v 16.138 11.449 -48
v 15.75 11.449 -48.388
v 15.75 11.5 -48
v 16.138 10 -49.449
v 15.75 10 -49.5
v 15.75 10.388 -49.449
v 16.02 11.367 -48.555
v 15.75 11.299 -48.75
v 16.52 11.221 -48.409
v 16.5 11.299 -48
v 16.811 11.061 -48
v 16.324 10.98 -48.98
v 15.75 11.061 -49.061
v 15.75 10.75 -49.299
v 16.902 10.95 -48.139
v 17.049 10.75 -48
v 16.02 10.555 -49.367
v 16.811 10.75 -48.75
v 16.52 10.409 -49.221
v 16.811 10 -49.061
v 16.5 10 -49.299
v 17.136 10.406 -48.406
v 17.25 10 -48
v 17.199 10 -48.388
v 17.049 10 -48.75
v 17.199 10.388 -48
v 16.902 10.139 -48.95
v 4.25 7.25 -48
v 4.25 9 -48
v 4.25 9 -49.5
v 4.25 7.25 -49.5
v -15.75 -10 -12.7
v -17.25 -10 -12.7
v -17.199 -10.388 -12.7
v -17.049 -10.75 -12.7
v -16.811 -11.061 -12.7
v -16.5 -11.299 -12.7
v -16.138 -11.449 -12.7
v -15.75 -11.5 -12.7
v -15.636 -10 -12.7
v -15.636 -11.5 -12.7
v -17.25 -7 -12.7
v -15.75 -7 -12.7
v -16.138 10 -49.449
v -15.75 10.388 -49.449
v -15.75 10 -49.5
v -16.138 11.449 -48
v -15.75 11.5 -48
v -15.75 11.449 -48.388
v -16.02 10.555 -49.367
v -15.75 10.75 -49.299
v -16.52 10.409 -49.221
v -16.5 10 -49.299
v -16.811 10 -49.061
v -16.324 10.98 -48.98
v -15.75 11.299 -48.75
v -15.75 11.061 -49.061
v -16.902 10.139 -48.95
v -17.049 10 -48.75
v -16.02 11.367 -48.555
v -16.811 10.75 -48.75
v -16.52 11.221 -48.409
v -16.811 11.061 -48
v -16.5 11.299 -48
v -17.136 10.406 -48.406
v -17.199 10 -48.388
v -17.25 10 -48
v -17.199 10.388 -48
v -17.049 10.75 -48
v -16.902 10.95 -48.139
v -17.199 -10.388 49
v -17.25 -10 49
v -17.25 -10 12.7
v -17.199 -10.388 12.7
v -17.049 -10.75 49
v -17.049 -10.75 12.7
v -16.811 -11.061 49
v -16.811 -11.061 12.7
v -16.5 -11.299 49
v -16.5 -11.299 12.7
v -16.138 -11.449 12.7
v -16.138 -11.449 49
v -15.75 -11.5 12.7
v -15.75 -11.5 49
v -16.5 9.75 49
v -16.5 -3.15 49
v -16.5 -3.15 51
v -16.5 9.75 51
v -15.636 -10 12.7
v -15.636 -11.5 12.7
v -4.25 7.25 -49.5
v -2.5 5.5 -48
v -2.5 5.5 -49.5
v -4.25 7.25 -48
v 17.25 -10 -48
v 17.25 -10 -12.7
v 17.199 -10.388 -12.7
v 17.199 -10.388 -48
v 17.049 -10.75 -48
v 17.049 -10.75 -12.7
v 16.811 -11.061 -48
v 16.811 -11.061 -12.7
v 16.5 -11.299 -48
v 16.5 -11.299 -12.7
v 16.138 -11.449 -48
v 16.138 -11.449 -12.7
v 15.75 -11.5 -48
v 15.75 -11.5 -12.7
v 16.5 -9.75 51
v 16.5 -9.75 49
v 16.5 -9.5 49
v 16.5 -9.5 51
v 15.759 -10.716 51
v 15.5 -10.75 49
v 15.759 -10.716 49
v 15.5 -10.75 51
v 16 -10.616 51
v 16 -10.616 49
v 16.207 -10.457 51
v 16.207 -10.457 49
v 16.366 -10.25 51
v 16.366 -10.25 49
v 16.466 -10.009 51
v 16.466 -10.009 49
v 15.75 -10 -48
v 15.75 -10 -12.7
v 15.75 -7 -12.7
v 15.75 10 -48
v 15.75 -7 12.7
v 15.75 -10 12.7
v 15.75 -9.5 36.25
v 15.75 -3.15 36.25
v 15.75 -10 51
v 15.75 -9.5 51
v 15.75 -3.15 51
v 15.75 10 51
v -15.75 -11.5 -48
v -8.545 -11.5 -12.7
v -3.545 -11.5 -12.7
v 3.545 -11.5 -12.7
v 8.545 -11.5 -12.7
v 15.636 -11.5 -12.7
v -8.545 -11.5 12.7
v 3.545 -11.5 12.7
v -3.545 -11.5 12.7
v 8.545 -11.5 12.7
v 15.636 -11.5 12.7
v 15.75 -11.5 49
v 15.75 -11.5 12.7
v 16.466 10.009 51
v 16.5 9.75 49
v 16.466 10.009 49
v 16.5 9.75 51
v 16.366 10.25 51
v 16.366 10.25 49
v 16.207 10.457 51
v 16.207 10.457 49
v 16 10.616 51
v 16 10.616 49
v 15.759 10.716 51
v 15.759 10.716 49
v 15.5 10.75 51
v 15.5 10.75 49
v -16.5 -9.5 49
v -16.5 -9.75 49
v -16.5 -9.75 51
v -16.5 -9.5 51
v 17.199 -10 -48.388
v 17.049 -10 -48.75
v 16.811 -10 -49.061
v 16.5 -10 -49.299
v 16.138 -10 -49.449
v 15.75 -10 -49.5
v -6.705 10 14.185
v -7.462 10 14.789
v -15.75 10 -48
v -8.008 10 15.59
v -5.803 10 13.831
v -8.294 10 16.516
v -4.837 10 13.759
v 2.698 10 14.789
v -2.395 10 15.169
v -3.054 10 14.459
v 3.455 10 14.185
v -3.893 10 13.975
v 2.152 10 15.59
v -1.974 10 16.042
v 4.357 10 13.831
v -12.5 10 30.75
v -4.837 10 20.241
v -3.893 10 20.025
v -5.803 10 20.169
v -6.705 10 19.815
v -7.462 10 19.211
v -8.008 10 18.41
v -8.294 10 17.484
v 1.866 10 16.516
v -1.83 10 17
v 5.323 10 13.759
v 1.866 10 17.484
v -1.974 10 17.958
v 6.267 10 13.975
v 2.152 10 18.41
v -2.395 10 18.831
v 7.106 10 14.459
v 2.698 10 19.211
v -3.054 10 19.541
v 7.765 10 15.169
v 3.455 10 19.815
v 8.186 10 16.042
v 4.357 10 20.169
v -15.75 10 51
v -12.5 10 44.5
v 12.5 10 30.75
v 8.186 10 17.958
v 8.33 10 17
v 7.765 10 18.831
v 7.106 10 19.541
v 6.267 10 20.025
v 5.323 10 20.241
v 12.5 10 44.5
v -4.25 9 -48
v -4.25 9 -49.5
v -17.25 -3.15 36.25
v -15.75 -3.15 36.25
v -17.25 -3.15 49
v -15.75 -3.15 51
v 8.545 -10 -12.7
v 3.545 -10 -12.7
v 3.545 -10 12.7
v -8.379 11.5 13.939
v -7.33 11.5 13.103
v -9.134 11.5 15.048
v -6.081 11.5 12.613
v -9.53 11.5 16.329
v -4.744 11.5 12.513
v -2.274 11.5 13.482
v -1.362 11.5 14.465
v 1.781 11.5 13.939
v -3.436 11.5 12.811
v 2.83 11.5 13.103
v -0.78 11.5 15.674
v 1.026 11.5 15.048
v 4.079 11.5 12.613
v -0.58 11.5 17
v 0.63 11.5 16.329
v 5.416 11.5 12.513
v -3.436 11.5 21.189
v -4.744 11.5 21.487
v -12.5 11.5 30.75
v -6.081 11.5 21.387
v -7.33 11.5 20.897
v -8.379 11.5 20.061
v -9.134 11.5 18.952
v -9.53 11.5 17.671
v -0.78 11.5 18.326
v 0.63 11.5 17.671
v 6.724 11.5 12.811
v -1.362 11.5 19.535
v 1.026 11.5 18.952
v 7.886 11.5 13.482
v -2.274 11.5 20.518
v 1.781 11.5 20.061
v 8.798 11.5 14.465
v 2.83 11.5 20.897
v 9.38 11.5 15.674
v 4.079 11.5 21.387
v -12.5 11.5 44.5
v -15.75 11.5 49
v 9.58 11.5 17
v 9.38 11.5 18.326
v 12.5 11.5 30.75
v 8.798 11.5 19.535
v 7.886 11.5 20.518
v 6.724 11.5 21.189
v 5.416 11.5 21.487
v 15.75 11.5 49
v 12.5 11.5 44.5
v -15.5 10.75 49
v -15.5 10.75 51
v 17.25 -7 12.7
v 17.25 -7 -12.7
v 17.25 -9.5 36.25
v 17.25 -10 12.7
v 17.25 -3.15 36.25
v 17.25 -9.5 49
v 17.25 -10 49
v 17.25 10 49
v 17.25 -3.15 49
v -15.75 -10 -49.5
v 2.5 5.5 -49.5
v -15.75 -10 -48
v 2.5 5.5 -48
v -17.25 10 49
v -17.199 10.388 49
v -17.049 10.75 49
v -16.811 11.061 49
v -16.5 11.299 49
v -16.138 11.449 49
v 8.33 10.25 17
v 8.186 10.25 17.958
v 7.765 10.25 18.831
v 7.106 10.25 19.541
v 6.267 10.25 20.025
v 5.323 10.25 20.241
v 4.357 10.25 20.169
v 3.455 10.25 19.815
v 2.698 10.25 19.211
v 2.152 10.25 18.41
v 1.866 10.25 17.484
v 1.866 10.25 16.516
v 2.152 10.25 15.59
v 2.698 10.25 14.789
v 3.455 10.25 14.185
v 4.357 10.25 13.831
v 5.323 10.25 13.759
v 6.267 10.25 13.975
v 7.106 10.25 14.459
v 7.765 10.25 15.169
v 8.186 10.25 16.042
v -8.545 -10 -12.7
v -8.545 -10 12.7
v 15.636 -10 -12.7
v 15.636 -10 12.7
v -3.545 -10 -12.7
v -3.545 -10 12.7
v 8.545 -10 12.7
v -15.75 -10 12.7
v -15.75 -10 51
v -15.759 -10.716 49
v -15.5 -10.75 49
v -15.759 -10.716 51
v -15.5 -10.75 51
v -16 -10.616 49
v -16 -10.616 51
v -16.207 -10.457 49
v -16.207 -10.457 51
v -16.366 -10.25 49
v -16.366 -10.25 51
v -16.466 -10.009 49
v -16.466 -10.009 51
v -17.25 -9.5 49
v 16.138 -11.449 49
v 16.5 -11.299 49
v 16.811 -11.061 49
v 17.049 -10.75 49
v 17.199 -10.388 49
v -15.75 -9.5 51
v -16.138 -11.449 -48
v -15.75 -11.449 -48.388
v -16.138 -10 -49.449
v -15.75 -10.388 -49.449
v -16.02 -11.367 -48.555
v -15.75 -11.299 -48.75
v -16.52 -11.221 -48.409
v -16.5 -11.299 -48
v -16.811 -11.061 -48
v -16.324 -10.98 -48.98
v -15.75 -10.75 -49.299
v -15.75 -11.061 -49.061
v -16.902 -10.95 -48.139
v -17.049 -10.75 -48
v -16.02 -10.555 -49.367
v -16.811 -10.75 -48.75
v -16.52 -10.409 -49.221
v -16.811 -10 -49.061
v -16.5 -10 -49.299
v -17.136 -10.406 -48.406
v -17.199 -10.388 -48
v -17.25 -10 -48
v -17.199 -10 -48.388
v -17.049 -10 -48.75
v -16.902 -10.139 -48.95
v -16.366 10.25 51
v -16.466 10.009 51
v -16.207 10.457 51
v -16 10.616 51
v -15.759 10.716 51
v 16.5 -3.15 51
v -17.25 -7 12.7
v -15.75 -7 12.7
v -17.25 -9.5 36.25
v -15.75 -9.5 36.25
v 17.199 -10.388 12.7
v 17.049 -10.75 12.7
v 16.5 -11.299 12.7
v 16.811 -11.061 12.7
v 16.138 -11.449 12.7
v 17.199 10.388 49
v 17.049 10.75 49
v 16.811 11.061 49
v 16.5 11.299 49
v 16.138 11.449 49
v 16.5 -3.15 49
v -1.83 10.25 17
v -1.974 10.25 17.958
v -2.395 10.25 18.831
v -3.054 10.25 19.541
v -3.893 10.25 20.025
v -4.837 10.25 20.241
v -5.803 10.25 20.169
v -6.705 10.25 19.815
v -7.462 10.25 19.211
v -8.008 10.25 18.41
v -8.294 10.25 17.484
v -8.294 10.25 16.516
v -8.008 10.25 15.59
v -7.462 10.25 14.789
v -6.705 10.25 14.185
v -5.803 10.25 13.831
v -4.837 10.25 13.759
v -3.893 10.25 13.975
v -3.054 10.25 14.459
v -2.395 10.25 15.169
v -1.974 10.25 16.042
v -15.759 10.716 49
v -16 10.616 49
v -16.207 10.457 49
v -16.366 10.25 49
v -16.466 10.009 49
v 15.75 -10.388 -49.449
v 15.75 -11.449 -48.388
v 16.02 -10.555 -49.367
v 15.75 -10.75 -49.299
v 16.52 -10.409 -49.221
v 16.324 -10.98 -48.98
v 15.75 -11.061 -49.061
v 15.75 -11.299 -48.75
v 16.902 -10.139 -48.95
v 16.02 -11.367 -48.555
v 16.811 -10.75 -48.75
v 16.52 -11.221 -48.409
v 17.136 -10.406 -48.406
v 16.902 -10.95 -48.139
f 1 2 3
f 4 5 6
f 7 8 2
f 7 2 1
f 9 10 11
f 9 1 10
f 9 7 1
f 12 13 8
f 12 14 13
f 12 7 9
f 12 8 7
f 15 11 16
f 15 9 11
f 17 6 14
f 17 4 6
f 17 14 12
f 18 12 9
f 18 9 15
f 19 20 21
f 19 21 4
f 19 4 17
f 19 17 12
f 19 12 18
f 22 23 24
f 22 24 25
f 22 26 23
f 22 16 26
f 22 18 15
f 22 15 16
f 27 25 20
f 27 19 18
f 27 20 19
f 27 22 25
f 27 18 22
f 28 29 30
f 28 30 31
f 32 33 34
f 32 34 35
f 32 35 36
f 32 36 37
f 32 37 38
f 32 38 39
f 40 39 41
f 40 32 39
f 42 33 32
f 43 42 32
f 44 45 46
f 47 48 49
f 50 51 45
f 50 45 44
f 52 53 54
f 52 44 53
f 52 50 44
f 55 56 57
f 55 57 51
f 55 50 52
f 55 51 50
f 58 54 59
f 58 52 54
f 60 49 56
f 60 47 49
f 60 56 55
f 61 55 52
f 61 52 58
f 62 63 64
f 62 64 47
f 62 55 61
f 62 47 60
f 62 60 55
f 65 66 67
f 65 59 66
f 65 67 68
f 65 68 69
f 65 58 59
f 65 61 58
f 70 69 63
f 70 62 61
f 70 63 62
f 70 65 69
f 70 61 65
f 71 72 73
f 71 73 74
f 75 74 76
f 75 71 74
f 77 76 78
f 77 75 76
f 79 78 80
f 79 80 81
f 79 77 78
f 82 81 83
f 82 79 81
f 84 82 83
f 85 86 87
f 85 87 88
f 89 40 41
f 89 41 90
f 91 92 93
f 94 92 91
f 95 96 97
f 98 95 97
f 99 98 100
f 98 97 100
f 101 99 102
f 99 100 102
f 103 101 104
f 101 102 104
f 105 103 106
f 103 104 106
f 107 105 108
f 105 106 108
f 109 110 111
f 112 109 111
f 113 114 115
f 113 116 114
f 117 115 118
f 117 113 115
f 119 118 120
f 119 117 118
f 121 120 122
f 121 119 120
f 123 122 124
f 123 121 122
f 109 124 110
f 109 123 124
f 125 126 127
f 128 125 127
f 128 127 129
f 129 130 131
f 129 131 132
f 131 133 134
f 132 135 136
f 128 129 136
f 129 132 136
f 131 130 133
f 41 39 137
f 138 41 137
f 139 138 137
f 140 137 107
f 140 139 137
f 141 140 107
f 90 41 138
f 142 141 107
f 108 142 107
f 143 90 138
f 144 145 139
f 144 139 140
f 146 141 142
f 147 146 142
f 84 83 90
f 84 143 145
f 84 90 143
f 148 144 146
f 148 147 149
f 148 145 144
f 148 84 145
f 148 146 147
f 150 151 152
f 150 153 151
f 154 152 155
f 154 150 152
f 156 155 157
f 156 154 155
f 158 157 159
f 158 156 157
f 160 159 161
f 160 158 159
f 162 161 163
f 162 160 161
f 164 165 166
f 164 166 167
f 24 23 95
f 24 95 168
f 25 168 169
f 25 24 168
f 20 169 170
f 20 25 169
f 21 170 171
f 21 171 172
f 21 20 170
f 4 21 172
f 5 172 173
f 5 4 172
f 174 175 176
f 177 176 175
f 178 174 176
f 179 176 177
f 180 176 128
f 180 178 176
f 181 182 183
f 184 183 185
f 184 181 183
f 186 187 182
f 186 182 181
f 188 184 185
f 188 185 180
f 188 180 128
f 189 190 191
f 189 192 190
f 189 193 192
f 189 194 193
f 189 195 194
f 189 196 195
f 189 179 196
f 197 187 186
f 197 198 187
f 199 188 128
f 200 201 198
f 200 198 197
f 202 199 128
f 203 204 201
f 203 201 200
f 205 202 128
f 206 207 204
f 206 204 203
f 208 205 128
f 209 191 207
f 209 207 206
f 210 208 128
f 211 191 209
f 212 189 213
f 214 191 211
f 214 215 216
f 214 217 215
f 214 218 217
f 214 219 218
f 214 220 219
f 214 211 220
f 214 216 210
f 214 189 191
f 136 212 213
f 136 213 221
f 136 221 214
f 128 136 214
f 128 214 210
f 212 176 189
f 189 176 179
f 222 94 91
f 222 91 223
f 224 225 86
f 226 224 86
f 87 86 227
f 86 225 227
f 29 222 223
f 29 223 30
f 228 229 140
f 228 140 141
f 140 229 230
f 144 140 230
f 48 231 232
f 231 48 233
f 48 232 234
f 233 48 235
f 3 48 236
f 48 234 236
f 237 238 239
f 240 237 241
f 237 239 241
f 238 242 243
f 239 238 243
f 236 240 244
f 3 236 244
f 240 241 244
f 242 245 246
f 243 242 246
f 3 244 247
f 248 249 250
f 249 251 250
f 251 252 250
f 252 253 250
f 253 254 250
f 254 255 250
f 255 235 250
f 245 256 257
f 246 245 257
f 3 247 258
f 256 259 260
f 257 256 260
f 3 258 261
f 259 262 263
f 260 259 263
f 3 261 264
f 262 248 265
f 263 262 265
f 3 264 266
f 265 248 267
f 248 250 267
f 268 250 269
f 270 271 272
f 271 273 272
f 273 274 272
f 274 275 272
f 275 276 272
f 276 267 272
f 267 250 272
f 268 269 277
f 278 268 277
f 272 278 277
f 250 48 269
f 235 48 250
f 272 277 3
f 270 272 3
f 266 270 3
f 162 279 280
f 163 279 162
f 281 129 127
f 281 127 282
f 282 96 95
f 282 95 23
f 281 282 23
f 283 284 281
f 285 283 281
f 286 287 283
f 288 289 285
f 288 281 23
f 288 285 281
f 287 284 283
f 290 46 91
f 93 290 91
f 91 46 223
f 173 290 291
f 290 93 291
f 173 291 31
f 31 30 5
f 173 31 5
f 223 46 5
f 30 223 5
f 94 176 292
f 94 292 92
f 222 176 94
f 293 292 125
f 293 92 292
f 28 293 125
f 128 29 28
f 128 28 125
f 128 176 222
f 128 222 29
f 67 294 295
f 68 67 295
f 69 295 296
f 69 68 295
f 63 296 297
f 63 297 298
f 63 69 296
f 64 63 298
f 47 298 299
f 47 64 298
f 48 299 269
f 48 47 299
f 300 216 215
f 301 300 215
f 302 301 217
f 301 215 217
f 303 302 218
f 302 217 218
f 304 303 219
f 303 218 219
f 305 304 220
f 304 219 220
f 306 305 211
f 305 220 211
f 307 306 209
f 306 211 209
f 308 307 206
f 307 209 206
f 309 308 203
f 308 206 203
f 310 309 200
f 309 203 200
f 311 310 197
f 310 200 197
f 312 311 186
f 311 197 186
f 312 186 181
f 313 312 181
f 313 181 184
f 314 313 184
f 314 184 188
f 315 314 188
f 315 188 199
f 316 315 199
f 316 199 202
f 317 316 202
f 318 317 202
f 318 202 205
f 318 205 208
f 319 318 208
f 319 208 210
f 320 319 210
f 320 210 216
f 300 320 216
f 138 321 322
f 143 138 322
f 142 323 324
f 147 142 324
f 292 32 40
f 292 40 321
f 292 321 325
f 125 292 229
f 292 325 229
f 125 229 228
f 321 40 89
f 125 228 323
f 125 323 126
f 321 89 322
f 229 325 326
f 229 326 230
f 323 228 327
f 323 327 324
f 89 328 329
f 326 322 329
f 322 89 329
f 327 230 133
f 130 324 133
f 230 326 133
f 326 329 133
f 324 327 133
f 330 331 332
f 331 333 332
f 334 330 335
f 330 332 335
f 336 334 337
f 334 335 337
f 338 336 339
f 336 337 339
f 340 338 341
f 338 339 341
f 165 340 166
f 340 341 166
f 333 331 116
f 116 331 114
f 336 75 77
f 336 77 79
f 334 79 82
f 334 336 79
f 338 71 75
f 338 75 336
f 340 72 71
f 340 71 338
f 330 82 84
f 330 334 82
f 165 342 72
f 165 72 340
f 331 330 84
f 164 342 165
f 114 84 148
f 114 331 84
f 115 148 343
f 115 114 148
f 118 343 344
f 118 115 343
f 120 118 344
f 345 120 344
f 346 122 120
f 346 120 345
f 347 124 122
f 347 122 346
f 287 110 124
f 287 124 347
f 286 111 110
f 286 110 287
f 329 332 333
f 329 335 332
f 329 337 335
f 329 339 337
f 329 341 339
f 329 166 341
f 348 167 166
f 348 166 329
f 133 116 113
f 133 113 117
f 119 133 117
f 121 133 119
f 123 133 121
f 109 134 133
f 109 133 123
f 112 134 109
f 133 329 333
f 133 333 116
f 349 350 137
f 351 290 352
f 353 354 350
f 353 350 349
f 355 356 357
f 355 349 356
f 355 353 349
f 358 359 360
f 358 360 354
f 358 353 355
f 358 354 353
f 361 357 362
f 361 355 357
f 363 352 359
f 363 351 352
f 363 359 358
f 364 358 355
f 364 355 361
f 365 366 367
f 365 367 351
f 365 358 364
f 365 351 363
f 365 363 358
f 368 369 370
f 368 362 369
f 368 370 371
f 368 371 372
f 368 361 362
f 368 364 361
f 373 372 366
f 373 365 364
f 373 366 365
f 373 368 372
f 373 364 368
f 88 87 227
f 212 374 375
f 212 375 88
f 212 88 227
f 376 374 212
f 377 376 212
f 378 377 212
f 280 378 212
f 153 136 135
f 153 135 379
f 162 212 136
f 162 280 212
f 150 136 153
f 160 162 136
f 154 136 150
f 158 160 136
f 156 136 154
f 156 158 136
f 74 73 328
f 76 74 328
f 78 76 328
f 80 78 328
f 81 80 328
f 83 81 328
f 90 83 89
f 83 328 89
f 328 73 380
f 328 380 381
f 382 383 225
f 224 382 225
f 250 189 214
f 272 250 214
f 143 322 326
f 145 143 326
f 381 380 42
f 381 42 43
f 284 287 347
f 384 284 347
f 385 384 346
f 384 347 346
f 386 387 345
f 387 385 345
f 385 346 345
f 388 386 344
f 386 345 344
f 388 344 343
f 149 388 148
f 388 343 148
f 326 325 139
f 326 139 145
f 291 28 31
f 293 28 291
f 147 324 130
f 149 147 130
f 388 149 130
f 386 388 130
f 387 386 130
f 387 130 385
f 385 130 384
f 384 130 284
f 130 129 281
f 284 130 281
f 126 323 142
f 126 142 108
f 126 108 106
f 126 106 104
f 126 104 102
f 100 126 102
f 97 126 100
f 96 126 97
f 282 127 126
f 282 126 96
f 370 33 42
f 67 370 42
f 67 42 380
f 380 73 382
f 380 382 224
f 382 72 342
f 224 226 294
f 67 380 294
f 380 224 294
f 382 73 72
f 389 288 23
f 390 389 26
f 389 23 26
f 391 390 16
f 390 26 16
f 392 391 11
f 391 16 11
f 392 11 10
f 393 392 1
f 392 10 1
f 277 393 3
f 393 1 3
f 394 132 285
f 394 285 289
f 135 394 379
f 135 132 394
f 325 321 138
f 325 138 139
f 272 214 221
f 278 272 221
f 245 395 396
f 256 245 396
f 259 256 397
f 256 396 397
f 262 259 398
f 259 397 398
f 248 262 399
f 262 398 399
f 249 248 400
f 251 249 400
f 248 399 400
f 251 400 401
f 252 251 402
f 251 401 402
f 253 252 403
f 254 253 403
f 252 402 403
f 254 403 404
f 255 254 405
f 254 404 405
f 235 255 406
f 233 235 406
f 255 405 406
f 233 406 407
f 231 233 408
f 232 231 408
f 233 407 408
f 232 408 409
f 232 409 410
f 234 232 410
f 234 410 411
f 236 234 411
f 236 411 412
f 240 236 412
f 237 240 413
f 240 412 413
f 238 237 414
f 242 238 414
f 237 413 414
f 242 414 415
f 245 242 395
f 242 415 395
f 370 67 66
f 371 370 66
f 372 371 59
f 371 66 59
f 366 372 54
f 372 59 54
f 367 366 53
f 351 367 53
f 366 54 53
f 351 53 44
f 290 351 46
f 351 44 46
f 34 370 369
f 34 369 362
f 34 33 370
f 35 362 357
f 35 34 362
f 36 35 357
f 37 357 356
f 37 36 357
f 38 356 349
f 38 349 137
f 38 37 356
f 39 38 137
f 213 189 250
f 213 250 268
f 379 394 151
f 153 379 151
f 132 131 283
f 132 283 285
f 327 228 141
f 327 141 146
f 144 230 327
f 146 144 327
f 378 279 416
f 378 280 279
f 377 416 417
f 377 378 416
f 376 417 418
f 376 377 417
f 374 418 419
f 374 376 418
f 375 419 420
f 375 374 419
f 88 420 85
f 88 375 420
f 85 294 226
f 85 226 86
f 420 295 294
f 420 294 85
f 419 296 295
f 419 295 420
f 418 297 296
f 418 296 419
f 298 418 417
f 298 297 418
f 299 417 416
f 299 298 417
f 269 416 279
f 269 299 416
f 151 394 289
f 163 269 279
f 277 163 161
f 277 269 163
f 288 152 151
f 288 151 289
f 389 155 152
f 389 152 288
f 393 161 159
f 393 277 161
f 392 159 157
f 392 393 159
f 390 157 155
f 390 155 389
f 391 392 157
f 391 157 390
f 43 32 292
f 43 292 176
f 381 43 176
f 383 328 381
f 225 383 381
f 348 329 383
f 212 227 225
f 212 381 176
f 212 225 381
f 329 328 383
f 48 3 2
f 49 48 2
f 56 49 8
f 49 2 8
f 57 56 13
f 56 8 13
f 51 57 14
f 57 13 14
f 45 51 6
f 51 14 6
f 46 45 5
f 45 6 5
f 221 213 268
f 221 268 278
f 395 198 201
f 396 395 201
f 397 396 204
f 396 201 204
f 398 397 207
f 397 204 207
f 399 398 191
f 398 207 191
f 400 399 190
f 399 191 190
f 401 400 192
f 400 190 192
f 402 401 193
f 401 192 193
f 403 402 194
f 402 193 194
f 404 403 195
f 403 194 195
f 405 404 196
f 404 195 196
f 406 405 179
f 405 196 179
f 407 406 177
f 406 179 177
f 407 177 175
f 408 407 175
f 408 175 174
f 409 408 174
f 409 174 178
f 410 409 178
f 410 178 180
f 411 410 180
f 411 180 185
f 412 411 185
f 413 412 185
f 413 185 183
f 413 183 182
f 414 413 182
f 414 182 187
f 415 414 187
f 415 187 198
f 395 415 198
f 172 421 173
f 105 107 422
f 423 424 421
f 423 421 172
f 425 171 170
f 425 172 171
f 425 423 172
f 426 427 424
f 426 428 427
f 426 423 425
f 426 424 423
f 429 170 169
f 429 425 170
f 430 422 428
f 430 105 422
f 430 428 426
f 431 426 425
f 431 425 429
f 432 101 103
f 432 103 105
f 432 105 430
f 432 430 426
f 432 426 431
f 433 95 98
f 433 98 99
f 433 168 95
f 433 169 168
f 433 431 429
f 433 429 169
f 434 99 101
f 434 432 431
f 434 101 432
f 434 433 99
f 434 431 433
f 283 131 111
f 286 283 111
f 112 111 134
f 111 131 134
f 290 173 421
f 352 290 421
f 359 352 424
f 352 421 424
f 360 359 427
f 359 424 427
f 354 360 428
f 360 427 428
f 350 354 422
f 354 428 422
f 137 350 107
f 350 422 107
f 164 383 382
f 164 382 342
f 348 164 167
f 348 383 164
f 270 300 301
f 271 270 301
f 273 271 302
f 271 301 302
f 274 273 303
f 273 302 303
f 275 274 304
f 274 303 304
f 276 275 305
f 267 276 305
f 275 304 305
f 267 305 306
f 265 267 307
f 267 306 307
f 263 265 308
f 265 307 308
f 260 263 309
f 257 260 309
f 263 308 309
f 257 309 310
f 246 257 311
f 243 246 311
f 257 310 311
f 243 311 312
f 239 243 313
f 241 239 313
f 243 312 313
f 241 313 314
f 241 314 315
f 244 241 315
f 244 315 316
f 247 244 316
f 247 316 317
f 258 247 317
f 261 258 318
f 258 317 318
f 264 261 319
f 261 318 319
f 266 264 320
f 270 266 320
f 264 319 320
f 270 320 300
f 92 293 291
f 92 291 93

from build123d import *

# Parameters (mm, degrees)
SKETCH036_W          = 31.5
SKETCH036_H          = 20
PAD022_DEPTH         = 51
PAD022_DEPTH_BACK    = 48
THICKNESS006_T       = 1.5
POCKET008_DEPTH      = 49.501
SKETCH039_W          = 11.02125
SKETCH039_H          = 25.4
SKETCH039_W_2        = 5
POCKET010_DEPTH      = 5
SKETCH040_W          = 6.35
SKETCH040_H          = 15.173466
POCKET011_DEPTH      = 17.251
POCKET011_DEPTH_BACK = 17.251
SKETCH044_R          = 3.25
SKETCH044_W          = 25
SKETCH044_H          = 13.75
POCKET013_DEPTH      = 11.501
CHAMFER006_SIZE      = 1.25
SKETCH049_W          = 36.888542
SKETCH049_H          = 25.404094
SKETCH049_W_2        = 33
SKETCH049_H_2        = 21.5
POCKET015_DEPTH      = 2.001
FILLET008_R          = 1


with BuildPart() as part:
    # Sketch036 → Pad022 (new body, two sides)
    with BuildSketch(Plane.XY) as pad022_sk:
        Rectangle(SKETCH036_W, SKETCH036_H)
    extrude(amount=PAD022_DEPTH)
    extrude(pad022_sk.sketch, amount=-PAD022_DEPTH_BACK)

    # Thickness006
    thickness006_openings = [part.faces().sort_by_distance(p)[0] for p in [
        (0, 0, 51),
    ]]
    offset(amount=THICKNESS006_T, openings=thickness006_openings)

    # Sketch037 → Pocket008 (cut, through all)
    with BuildSketch(Plane.XY):
        Polygon((-4.25, 9), (4.25, 9), (4.25, 7.25), (2.5, 5.5), (-2.5, 5.5), (-4.25, 7.25), align=None)
    extrude(amount=-POCKET008_DEPTH, mode=Mode.SUBTRACT)

    # Sketch039 → Pocket010 (cut)
    with BuildSketch(Plane.XZ.offset(7)):
        with Locations((-21.146455, 0)):
            Rectangle(SKETCH039_W, SKETCH039_H)
        with Locations((-6.045277, 0)):
            Rectangle(SKETCH039_W_2, SKETCH039_H)
        with Locations((6.045277, 0)):
            Rectangle(SKETCH039_W_2, SKETCH039_H)
        with Locations((21.146455, 0)):
            Rectangle(SKETCH039_W, SKETCH039_H)
    extrude(amount=POCKET010_DEPTH, mode=Mode.SUBTRACT)

    # Sketch040 → Pocket011 (cut, two sides)
    with BuildSketch(Plane.YZ) as pocket011_sk:
        with Locations((-6.325, 43.836733)):
            Rectangle(SKETCH040_W, SKETCH040_H)
    extrude(amount=-POCKET011_DEPTH, mode=Mode.SUBTRACT)
    extrude(pocket011_sk.sketch, amount=POCKET011_DEPTH_BACK, mode=Mode.SUBTRACT)

    # Sketch044 → Pocket013 (cut, through all)
    with BuildSketch(Plane.XZ):
        with Locations((-5.08, 17)):
            Circle(SKETCH044_R)
        with Locations((5.08, 17)):
            Circle(SKETCH044_R)
        with Locations((0, 37.625)):
            Rectangle(SKETCH044_W, SKETCH044_H)
    extrude(amount=-POCKET013_DEPTH, mode=Mode.SUBTRACT)

    # Chamfer006
    chamfer006_edges = [part.edges().sort_by_distance(p)[0] for p in [
        (1.83, 11.5, 17),
        (-8.33, 11.5, 17),
    ]]
    chamfer(chamfer006_edges, length=CHAMFER006_SIZE)

    # Sketch049 → Pocket015 (cut, through all)
    with BuildSketch(Plane.XY.offset(49)):
        Rectangle(SKETCH049_W, SKETCH049_H)
        Rectangle(SKETCH049_W_2, SKETCH049_H_2, mode=Mode.SUBTRACT)
    extrude(amount=POCKET015_DEPTH, mode=Mode.SUBTRACT)

    # Fillet008
    fillet008_edges = [part.edges().sort_by_distance(p)[0] for p in [
        (-16.5, 10.75, 50),
        (-16.5, -10.75, 50),
        (16.5, -10.75, 50),
        (16.5, 10.75, 50),
    ]]
    fillet(fillet008_edges, radius=FILLET008_R)


solid = part.part
